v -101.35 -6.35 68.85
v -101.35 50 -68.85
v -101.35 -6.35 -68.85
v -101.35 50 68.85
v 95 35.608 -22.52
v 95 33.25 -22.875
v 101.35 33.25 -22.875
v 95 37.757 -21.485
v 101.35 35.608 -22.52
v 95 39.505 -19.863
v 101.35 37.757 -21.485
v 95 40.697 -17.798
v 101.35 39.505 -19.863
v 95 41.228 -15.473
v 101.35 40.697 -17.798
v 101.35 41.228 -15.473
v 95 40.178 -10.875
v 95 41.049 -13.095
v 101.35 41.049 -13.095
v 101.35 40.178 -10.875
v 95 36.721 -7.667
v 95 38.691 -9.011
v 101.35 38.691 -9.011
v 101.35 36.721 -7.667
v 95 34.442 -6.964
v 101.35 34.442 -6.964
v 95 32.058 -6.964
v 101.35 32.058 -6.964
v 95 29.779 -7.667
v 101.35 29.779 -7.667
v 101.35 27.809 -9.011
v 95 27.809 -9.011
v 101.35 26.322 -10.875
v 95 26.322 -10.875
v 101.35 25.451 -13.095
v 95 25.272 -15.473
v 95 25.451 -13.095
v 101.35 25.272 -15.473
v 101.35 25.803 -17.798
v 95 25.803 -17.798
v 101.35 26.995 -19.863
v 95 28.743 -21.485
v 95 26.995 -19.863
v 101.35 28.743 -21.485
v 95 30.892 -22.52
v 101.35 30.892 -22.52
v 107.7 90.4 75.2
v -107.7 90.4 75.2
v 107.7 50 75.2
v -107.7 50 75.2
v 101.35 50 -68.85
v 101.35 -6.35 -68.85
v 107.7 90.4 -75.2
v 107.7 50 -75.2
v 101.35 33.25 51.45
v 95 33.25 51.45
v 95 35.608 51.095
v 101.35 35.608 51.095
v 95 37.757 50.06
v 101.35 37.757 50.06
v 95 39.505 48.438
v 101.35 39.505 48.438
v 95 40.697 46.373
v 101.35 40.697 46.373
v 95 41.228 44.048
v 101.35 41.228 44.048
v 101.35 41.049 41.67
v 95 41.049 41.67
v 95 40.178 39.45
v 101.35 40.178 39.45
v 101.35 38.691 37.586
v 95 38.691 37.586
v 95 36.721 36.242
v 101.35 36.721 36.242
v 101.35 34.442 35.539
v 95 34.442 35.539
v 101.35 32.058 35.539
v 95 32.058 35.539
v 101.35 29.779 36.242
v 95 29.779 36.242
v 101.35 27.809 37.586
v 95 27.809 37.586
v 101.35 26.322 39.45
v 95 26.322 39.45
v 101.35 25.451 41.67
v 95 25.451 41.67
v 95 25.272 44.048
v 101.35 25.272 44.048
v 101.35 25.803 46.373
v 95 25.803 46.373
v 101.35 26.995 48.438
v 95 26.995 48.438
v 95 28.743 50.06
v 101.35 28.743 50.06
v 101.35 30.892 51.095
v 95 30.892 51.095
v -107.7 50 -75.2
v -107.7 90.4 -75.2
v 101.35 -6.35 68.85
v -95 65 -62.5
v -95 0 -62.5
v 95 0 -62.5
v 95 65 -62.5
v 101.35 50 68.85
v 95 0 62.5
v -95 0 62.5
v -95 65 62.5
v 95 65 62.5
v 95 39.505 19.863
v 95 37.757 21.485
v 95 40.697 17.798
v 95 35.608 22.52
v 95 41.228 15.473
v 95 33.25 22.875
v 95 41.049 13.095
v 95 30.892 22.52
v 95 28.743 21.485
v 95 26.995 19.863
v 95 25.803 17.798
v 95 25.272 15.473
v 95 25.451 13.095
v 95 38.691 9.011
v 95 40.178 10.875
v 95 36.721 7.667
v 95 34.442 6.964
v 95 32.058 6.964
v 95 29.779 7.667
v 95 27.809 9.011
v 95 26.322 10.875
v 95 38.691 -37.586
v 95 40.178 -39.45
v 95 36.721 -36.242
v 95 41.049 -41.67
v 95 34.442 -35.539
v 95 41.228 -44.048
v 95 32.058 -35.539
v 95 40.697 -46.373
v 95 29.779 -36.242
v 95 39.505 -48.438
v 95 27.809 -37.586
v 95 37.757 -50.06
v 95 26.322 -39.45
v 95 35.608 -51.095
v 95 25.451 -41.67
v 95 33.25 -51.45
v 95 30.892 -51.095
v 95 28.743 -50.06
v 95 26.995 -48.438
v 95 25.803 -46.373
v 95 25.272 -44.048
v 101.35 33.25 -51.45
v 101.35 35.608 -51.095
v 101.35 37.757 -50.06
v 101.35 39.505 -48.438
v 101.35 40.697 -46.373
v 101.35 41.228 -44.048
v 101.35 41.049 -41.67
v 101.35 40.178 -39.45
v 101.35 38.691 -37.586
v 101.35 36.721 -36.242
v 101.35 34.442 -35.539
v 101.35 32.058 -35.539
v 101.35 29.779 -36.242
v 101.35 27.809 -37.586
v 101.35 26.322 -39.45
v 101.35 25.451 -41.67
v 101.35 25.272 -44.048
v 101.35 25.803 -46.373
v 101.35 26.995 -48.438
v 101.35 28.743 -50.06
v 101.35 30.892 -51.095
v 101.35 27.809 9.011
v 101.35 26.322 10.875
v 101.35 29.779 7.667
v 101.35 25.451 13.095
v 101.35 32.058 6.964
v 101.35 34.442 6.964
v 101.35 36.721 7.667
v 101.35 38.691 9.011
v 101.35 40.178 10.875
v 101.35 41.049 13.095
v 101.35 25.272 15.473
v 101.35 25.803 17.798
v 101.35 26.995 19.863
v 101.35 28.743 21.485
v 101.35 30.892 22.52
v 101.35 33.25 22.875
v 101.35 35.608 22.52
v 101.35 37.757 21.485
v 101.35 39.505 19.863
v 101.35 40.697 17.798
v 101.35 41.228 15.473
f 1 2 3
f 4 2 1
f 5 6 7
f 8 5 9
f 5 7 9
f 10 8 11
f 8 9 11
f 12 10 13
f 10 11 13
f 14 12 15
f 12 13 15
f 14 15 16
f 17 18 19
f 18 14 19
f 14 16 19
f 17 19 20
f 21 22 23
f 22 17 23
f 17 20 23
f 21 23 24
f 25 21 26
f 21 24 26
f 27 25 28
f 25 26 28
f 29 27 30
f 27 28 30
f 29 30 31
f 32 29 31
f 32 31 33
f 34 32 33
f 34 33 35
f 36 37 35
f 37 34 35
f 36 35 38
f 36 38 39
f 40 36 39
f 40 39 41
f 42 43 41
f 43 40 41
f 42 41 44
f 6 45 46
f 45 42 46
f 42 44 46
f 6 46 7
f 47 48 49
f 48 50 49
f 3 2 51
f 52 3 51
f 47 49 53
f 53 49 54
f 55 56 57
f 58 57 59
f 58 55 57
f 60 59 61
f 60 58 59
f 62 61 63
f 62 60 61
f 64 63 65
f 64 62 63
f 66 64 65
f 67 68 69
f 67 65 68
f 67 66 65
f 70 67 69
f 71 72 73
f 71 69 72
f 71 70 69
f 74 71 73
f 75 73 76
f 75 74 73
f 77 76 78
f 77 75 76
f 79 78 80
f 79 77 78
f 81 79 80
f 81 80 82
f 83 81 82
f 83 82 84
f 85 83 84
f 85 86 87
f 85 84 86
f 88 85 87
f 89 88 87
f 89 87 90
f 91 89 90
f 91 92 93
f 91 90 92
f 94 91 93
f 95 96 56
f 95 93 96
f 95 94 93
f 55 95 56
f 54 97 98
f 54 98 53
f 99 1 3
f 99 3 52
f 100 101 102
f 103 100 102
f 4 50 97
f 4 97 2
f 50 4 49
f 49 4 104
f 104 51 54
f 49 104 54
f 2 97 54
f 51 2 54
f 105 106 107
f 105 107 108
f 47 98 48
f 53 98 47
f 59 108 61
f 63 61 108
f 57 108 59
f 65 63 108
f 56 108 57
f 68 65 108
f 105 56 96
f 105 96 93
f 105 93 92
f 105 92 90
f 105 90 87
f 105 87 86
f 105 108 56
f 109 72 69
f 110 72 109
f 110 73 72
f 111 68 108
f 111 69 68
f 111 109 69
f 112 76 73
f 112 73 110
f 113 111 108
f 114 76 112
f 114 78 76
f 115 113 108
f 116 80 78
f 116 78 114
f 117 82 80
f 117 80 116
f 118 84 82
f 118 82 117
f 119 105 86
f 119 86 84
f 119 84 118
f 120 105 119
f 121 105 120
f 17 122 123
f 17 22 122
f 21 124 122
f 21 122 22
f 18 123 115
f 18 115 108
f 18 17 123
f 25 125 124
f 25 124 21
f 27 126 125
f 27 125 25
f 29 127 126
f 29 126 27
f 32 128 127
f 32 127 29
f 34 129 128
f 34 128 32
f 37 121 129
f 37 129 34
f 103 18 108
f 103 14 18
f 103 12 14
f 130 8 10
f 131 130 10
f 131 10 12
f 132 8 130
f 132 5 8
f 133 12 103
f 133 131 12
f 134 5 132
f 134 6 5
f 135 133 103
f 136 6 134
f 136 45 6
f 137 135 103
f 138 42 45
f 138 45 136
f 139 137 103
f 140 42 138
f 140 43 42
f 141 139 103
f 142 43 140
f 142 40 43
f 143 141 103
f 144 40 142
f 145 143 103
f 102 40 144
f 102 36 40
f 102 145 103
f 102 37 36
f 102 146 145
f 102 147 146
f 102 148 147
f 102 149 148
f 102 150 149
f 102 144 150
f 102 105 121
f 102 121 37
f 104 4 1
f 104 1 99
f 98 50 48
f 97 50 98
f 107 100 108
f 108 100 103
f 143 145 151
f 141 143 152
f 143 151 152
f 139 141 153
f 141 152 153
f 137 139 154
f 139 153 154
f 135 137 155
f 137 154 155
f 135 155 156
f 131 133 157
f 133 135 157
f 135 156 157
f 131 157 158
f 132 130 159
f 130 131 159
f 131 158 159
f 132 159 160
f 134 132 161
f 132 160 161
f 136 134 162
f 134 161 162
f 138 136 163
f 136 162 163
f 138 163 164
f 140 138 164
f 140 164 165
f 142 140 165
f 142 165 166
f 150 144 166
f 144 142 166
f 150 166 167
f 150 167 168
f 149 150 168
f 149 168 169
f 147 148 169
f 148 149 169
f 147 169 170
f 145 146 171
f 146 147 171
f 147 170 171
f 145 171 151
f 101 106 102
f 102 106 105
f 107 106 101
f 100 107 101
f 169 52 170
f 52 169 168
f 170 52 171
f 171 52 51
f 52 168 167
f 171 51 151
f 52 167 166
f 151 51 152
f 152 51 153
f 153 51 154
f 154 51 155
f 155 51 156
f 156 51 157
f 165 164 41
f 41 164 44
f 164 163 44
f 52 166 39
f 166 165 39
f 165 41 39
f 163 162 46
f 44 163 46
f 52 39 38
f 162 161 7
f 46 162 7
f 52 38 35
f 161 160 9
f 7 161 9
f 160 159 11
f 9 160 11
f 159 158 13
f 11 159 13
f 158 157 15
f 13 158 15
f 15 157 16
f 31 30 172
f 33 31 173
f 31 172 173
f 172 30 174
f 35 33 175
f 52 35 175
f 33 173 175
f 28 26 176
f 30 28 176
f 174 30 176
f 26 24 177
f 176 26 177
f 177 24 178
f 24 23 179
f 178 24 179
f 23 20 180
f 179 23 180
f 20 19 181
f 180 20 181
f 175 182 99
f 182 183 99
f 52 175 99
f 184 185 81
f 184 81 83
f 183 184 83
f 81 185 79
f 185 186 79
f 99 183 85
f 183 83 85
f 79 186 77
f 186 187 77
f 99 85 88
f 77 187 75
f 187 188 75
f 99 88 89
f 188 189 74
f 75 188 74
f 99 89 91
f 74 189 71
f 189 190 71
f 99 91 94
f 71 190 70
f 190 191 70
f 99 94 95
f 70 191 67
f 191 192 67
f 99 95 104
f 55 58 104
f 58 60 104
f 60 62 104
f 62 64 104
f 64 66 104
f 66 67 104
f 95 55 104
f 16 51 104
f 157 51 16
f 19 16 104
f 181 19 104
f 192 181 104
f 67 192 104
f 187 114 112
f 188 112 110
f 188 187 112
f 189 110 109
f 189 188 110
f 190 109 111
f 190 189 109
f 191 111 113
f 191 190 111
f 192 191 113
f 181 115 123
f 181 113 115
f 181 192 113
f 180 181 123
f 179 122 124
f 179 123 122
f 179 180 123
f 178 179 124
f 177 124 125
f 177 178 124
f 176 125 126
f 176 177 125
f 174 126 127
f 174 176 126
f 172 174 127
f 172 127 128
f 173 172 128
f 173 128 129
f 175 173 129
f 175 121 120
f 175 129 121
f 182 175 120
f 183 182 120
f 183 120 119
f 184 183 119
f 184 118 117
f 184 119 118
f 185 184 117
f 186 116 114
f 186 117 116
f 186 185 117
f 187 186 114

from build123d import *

# Parameters (mm, degrees)
SKETCH1_W           = 202.7
SKETCH1_H           = 137.7
SKETCH1_W_2         = 190
SKETCH1_H_2         = 125
BOSS_EXTRUDE1_DEPTH = 65
SKETCH2_W           = 202.7
SKETCH2_H           = 137.7
BOSS_EXTRUDE2_DEPTH = 6.35
CUT_EXTRUDE1_REACH  = 225.724
SKETCH3_R           = 8
SKETCH4_W           = 215.4
SKETCH4_H           = 150.4
SKETCH4_W_2         = 202.7
SKETCH4_H_2         = 137.7
BOSS_EXTRUDE3_DEPTH = 15
SKETCH5_W           = 215.4
SKETCH5_H           = 150.4
BOSS_EXTRUDE4_DEPTH = 25.4


with BuildPart() as part:
    # Sketch1 → Boss-Extrude1 (new body)
    with BuildSketch(Plane(origin=(0, 0, 0), x_dir=(1, 0, 0), z_dir=(0, 1, 0))):
        Rectangle(SKETCH1_W, SKETCH1_H)
        Rectangle(SKETCH1_W_2, SKETCH1_H_2, mode=Mode.SUBTRACT)
    extrude(amount=BOSS_EXTRUDE1_DEPTH)

    # Sketch2 → Boss-Extrude2 (add)
    with BuildSketch(Plane.XZ):
        Rectangle(SKETCH2_W, SKETCH2_H)
    extrude(amount=BOSS_EXTRUDE2_DEPTH)

    # Sketch3 → Cut-Extrude1 (cut, up to next)
    with BuildSketch(Plane.ZY.offset(-101.35), mode=Mode.PRIVATE) as cut_extrude1_sk1:
        with Locations((14.875, 33.25)):
            Circle(SKETCH3_R)
    cut_extrude1_tool1 = extrude(cut_extrude1_sk1.sketch, amount=CUT_EXTRUDE1_REACH, mode=Mode.PRIVATE) & part.part
    # Sketch3 → Cut-Extrude1 (cut, up to next)
    with BuildSketch(Plane.ZY.offset(-101.35), mode=Mode.PRIVATE) as cut_extrude1_sk2:
        with Locations((43.45, 33.25)):
            Circle(SKETCH3_R)
    cut_extrude1_tool2 = extrude(cut_extrude1_sk2.sketch, amount=CUT_EXTRUDE1_REACH, mode=Mode.PRIVATE) & part.part
    cut_extrude1_1 = cut_extrude1_tool1.solids().sort_by_distance((101.35, 33.25, 14.875))[0]
    add(cut_extrude1_1, mode=Mode.SUBTRACT)
    cut_extrude1_2 = cut_extrude1_tool2.solids().sort_by_distance((101.35, 33.25, 43.45))[0]
    add(cut_extrude1_2, mode=Mode.SUBTRACT)
    cut_extrude1 = cut_extrude1_1 + cut_extrude1_2  # Cut-Extrude1 as one shape, for the pattern or mirror that repeats it

    # Mirror1: Cut-Extrude1 across plane
    add(cut_extrude1.mirror(Plane.XY), mode=Mode.SUBTRACT)

    # Sketch4 → Boss-Extrude3 (add)
    with BuildSketch(Plane(origin=(0, 65, 0), x_dir=(1, 0, 0), z_dir=(0, 1, 0))):
        Rectangle(SKETCH4_W, SKETCH4_H)
        Rectangle(SKETCH4_W_2, SKETCH4_H_2, mode=Mode.SUBTRACT)
    extrude(amount=-BOSS_EXTRUDE3_DEPTH)

    # Sketch5 → Boss-Extrude4 (add)
    with BuildSketch(Plane(origin=(0, 65, 0), x_dir=(1, 0, 0), z_dir=(0, 1, 0))):
        Rectangle(SKETCH5_W, SKETCH5_H)
    extrude(amount=BOSS_EXTRUDE4_DEPTH)


solid = part.part
